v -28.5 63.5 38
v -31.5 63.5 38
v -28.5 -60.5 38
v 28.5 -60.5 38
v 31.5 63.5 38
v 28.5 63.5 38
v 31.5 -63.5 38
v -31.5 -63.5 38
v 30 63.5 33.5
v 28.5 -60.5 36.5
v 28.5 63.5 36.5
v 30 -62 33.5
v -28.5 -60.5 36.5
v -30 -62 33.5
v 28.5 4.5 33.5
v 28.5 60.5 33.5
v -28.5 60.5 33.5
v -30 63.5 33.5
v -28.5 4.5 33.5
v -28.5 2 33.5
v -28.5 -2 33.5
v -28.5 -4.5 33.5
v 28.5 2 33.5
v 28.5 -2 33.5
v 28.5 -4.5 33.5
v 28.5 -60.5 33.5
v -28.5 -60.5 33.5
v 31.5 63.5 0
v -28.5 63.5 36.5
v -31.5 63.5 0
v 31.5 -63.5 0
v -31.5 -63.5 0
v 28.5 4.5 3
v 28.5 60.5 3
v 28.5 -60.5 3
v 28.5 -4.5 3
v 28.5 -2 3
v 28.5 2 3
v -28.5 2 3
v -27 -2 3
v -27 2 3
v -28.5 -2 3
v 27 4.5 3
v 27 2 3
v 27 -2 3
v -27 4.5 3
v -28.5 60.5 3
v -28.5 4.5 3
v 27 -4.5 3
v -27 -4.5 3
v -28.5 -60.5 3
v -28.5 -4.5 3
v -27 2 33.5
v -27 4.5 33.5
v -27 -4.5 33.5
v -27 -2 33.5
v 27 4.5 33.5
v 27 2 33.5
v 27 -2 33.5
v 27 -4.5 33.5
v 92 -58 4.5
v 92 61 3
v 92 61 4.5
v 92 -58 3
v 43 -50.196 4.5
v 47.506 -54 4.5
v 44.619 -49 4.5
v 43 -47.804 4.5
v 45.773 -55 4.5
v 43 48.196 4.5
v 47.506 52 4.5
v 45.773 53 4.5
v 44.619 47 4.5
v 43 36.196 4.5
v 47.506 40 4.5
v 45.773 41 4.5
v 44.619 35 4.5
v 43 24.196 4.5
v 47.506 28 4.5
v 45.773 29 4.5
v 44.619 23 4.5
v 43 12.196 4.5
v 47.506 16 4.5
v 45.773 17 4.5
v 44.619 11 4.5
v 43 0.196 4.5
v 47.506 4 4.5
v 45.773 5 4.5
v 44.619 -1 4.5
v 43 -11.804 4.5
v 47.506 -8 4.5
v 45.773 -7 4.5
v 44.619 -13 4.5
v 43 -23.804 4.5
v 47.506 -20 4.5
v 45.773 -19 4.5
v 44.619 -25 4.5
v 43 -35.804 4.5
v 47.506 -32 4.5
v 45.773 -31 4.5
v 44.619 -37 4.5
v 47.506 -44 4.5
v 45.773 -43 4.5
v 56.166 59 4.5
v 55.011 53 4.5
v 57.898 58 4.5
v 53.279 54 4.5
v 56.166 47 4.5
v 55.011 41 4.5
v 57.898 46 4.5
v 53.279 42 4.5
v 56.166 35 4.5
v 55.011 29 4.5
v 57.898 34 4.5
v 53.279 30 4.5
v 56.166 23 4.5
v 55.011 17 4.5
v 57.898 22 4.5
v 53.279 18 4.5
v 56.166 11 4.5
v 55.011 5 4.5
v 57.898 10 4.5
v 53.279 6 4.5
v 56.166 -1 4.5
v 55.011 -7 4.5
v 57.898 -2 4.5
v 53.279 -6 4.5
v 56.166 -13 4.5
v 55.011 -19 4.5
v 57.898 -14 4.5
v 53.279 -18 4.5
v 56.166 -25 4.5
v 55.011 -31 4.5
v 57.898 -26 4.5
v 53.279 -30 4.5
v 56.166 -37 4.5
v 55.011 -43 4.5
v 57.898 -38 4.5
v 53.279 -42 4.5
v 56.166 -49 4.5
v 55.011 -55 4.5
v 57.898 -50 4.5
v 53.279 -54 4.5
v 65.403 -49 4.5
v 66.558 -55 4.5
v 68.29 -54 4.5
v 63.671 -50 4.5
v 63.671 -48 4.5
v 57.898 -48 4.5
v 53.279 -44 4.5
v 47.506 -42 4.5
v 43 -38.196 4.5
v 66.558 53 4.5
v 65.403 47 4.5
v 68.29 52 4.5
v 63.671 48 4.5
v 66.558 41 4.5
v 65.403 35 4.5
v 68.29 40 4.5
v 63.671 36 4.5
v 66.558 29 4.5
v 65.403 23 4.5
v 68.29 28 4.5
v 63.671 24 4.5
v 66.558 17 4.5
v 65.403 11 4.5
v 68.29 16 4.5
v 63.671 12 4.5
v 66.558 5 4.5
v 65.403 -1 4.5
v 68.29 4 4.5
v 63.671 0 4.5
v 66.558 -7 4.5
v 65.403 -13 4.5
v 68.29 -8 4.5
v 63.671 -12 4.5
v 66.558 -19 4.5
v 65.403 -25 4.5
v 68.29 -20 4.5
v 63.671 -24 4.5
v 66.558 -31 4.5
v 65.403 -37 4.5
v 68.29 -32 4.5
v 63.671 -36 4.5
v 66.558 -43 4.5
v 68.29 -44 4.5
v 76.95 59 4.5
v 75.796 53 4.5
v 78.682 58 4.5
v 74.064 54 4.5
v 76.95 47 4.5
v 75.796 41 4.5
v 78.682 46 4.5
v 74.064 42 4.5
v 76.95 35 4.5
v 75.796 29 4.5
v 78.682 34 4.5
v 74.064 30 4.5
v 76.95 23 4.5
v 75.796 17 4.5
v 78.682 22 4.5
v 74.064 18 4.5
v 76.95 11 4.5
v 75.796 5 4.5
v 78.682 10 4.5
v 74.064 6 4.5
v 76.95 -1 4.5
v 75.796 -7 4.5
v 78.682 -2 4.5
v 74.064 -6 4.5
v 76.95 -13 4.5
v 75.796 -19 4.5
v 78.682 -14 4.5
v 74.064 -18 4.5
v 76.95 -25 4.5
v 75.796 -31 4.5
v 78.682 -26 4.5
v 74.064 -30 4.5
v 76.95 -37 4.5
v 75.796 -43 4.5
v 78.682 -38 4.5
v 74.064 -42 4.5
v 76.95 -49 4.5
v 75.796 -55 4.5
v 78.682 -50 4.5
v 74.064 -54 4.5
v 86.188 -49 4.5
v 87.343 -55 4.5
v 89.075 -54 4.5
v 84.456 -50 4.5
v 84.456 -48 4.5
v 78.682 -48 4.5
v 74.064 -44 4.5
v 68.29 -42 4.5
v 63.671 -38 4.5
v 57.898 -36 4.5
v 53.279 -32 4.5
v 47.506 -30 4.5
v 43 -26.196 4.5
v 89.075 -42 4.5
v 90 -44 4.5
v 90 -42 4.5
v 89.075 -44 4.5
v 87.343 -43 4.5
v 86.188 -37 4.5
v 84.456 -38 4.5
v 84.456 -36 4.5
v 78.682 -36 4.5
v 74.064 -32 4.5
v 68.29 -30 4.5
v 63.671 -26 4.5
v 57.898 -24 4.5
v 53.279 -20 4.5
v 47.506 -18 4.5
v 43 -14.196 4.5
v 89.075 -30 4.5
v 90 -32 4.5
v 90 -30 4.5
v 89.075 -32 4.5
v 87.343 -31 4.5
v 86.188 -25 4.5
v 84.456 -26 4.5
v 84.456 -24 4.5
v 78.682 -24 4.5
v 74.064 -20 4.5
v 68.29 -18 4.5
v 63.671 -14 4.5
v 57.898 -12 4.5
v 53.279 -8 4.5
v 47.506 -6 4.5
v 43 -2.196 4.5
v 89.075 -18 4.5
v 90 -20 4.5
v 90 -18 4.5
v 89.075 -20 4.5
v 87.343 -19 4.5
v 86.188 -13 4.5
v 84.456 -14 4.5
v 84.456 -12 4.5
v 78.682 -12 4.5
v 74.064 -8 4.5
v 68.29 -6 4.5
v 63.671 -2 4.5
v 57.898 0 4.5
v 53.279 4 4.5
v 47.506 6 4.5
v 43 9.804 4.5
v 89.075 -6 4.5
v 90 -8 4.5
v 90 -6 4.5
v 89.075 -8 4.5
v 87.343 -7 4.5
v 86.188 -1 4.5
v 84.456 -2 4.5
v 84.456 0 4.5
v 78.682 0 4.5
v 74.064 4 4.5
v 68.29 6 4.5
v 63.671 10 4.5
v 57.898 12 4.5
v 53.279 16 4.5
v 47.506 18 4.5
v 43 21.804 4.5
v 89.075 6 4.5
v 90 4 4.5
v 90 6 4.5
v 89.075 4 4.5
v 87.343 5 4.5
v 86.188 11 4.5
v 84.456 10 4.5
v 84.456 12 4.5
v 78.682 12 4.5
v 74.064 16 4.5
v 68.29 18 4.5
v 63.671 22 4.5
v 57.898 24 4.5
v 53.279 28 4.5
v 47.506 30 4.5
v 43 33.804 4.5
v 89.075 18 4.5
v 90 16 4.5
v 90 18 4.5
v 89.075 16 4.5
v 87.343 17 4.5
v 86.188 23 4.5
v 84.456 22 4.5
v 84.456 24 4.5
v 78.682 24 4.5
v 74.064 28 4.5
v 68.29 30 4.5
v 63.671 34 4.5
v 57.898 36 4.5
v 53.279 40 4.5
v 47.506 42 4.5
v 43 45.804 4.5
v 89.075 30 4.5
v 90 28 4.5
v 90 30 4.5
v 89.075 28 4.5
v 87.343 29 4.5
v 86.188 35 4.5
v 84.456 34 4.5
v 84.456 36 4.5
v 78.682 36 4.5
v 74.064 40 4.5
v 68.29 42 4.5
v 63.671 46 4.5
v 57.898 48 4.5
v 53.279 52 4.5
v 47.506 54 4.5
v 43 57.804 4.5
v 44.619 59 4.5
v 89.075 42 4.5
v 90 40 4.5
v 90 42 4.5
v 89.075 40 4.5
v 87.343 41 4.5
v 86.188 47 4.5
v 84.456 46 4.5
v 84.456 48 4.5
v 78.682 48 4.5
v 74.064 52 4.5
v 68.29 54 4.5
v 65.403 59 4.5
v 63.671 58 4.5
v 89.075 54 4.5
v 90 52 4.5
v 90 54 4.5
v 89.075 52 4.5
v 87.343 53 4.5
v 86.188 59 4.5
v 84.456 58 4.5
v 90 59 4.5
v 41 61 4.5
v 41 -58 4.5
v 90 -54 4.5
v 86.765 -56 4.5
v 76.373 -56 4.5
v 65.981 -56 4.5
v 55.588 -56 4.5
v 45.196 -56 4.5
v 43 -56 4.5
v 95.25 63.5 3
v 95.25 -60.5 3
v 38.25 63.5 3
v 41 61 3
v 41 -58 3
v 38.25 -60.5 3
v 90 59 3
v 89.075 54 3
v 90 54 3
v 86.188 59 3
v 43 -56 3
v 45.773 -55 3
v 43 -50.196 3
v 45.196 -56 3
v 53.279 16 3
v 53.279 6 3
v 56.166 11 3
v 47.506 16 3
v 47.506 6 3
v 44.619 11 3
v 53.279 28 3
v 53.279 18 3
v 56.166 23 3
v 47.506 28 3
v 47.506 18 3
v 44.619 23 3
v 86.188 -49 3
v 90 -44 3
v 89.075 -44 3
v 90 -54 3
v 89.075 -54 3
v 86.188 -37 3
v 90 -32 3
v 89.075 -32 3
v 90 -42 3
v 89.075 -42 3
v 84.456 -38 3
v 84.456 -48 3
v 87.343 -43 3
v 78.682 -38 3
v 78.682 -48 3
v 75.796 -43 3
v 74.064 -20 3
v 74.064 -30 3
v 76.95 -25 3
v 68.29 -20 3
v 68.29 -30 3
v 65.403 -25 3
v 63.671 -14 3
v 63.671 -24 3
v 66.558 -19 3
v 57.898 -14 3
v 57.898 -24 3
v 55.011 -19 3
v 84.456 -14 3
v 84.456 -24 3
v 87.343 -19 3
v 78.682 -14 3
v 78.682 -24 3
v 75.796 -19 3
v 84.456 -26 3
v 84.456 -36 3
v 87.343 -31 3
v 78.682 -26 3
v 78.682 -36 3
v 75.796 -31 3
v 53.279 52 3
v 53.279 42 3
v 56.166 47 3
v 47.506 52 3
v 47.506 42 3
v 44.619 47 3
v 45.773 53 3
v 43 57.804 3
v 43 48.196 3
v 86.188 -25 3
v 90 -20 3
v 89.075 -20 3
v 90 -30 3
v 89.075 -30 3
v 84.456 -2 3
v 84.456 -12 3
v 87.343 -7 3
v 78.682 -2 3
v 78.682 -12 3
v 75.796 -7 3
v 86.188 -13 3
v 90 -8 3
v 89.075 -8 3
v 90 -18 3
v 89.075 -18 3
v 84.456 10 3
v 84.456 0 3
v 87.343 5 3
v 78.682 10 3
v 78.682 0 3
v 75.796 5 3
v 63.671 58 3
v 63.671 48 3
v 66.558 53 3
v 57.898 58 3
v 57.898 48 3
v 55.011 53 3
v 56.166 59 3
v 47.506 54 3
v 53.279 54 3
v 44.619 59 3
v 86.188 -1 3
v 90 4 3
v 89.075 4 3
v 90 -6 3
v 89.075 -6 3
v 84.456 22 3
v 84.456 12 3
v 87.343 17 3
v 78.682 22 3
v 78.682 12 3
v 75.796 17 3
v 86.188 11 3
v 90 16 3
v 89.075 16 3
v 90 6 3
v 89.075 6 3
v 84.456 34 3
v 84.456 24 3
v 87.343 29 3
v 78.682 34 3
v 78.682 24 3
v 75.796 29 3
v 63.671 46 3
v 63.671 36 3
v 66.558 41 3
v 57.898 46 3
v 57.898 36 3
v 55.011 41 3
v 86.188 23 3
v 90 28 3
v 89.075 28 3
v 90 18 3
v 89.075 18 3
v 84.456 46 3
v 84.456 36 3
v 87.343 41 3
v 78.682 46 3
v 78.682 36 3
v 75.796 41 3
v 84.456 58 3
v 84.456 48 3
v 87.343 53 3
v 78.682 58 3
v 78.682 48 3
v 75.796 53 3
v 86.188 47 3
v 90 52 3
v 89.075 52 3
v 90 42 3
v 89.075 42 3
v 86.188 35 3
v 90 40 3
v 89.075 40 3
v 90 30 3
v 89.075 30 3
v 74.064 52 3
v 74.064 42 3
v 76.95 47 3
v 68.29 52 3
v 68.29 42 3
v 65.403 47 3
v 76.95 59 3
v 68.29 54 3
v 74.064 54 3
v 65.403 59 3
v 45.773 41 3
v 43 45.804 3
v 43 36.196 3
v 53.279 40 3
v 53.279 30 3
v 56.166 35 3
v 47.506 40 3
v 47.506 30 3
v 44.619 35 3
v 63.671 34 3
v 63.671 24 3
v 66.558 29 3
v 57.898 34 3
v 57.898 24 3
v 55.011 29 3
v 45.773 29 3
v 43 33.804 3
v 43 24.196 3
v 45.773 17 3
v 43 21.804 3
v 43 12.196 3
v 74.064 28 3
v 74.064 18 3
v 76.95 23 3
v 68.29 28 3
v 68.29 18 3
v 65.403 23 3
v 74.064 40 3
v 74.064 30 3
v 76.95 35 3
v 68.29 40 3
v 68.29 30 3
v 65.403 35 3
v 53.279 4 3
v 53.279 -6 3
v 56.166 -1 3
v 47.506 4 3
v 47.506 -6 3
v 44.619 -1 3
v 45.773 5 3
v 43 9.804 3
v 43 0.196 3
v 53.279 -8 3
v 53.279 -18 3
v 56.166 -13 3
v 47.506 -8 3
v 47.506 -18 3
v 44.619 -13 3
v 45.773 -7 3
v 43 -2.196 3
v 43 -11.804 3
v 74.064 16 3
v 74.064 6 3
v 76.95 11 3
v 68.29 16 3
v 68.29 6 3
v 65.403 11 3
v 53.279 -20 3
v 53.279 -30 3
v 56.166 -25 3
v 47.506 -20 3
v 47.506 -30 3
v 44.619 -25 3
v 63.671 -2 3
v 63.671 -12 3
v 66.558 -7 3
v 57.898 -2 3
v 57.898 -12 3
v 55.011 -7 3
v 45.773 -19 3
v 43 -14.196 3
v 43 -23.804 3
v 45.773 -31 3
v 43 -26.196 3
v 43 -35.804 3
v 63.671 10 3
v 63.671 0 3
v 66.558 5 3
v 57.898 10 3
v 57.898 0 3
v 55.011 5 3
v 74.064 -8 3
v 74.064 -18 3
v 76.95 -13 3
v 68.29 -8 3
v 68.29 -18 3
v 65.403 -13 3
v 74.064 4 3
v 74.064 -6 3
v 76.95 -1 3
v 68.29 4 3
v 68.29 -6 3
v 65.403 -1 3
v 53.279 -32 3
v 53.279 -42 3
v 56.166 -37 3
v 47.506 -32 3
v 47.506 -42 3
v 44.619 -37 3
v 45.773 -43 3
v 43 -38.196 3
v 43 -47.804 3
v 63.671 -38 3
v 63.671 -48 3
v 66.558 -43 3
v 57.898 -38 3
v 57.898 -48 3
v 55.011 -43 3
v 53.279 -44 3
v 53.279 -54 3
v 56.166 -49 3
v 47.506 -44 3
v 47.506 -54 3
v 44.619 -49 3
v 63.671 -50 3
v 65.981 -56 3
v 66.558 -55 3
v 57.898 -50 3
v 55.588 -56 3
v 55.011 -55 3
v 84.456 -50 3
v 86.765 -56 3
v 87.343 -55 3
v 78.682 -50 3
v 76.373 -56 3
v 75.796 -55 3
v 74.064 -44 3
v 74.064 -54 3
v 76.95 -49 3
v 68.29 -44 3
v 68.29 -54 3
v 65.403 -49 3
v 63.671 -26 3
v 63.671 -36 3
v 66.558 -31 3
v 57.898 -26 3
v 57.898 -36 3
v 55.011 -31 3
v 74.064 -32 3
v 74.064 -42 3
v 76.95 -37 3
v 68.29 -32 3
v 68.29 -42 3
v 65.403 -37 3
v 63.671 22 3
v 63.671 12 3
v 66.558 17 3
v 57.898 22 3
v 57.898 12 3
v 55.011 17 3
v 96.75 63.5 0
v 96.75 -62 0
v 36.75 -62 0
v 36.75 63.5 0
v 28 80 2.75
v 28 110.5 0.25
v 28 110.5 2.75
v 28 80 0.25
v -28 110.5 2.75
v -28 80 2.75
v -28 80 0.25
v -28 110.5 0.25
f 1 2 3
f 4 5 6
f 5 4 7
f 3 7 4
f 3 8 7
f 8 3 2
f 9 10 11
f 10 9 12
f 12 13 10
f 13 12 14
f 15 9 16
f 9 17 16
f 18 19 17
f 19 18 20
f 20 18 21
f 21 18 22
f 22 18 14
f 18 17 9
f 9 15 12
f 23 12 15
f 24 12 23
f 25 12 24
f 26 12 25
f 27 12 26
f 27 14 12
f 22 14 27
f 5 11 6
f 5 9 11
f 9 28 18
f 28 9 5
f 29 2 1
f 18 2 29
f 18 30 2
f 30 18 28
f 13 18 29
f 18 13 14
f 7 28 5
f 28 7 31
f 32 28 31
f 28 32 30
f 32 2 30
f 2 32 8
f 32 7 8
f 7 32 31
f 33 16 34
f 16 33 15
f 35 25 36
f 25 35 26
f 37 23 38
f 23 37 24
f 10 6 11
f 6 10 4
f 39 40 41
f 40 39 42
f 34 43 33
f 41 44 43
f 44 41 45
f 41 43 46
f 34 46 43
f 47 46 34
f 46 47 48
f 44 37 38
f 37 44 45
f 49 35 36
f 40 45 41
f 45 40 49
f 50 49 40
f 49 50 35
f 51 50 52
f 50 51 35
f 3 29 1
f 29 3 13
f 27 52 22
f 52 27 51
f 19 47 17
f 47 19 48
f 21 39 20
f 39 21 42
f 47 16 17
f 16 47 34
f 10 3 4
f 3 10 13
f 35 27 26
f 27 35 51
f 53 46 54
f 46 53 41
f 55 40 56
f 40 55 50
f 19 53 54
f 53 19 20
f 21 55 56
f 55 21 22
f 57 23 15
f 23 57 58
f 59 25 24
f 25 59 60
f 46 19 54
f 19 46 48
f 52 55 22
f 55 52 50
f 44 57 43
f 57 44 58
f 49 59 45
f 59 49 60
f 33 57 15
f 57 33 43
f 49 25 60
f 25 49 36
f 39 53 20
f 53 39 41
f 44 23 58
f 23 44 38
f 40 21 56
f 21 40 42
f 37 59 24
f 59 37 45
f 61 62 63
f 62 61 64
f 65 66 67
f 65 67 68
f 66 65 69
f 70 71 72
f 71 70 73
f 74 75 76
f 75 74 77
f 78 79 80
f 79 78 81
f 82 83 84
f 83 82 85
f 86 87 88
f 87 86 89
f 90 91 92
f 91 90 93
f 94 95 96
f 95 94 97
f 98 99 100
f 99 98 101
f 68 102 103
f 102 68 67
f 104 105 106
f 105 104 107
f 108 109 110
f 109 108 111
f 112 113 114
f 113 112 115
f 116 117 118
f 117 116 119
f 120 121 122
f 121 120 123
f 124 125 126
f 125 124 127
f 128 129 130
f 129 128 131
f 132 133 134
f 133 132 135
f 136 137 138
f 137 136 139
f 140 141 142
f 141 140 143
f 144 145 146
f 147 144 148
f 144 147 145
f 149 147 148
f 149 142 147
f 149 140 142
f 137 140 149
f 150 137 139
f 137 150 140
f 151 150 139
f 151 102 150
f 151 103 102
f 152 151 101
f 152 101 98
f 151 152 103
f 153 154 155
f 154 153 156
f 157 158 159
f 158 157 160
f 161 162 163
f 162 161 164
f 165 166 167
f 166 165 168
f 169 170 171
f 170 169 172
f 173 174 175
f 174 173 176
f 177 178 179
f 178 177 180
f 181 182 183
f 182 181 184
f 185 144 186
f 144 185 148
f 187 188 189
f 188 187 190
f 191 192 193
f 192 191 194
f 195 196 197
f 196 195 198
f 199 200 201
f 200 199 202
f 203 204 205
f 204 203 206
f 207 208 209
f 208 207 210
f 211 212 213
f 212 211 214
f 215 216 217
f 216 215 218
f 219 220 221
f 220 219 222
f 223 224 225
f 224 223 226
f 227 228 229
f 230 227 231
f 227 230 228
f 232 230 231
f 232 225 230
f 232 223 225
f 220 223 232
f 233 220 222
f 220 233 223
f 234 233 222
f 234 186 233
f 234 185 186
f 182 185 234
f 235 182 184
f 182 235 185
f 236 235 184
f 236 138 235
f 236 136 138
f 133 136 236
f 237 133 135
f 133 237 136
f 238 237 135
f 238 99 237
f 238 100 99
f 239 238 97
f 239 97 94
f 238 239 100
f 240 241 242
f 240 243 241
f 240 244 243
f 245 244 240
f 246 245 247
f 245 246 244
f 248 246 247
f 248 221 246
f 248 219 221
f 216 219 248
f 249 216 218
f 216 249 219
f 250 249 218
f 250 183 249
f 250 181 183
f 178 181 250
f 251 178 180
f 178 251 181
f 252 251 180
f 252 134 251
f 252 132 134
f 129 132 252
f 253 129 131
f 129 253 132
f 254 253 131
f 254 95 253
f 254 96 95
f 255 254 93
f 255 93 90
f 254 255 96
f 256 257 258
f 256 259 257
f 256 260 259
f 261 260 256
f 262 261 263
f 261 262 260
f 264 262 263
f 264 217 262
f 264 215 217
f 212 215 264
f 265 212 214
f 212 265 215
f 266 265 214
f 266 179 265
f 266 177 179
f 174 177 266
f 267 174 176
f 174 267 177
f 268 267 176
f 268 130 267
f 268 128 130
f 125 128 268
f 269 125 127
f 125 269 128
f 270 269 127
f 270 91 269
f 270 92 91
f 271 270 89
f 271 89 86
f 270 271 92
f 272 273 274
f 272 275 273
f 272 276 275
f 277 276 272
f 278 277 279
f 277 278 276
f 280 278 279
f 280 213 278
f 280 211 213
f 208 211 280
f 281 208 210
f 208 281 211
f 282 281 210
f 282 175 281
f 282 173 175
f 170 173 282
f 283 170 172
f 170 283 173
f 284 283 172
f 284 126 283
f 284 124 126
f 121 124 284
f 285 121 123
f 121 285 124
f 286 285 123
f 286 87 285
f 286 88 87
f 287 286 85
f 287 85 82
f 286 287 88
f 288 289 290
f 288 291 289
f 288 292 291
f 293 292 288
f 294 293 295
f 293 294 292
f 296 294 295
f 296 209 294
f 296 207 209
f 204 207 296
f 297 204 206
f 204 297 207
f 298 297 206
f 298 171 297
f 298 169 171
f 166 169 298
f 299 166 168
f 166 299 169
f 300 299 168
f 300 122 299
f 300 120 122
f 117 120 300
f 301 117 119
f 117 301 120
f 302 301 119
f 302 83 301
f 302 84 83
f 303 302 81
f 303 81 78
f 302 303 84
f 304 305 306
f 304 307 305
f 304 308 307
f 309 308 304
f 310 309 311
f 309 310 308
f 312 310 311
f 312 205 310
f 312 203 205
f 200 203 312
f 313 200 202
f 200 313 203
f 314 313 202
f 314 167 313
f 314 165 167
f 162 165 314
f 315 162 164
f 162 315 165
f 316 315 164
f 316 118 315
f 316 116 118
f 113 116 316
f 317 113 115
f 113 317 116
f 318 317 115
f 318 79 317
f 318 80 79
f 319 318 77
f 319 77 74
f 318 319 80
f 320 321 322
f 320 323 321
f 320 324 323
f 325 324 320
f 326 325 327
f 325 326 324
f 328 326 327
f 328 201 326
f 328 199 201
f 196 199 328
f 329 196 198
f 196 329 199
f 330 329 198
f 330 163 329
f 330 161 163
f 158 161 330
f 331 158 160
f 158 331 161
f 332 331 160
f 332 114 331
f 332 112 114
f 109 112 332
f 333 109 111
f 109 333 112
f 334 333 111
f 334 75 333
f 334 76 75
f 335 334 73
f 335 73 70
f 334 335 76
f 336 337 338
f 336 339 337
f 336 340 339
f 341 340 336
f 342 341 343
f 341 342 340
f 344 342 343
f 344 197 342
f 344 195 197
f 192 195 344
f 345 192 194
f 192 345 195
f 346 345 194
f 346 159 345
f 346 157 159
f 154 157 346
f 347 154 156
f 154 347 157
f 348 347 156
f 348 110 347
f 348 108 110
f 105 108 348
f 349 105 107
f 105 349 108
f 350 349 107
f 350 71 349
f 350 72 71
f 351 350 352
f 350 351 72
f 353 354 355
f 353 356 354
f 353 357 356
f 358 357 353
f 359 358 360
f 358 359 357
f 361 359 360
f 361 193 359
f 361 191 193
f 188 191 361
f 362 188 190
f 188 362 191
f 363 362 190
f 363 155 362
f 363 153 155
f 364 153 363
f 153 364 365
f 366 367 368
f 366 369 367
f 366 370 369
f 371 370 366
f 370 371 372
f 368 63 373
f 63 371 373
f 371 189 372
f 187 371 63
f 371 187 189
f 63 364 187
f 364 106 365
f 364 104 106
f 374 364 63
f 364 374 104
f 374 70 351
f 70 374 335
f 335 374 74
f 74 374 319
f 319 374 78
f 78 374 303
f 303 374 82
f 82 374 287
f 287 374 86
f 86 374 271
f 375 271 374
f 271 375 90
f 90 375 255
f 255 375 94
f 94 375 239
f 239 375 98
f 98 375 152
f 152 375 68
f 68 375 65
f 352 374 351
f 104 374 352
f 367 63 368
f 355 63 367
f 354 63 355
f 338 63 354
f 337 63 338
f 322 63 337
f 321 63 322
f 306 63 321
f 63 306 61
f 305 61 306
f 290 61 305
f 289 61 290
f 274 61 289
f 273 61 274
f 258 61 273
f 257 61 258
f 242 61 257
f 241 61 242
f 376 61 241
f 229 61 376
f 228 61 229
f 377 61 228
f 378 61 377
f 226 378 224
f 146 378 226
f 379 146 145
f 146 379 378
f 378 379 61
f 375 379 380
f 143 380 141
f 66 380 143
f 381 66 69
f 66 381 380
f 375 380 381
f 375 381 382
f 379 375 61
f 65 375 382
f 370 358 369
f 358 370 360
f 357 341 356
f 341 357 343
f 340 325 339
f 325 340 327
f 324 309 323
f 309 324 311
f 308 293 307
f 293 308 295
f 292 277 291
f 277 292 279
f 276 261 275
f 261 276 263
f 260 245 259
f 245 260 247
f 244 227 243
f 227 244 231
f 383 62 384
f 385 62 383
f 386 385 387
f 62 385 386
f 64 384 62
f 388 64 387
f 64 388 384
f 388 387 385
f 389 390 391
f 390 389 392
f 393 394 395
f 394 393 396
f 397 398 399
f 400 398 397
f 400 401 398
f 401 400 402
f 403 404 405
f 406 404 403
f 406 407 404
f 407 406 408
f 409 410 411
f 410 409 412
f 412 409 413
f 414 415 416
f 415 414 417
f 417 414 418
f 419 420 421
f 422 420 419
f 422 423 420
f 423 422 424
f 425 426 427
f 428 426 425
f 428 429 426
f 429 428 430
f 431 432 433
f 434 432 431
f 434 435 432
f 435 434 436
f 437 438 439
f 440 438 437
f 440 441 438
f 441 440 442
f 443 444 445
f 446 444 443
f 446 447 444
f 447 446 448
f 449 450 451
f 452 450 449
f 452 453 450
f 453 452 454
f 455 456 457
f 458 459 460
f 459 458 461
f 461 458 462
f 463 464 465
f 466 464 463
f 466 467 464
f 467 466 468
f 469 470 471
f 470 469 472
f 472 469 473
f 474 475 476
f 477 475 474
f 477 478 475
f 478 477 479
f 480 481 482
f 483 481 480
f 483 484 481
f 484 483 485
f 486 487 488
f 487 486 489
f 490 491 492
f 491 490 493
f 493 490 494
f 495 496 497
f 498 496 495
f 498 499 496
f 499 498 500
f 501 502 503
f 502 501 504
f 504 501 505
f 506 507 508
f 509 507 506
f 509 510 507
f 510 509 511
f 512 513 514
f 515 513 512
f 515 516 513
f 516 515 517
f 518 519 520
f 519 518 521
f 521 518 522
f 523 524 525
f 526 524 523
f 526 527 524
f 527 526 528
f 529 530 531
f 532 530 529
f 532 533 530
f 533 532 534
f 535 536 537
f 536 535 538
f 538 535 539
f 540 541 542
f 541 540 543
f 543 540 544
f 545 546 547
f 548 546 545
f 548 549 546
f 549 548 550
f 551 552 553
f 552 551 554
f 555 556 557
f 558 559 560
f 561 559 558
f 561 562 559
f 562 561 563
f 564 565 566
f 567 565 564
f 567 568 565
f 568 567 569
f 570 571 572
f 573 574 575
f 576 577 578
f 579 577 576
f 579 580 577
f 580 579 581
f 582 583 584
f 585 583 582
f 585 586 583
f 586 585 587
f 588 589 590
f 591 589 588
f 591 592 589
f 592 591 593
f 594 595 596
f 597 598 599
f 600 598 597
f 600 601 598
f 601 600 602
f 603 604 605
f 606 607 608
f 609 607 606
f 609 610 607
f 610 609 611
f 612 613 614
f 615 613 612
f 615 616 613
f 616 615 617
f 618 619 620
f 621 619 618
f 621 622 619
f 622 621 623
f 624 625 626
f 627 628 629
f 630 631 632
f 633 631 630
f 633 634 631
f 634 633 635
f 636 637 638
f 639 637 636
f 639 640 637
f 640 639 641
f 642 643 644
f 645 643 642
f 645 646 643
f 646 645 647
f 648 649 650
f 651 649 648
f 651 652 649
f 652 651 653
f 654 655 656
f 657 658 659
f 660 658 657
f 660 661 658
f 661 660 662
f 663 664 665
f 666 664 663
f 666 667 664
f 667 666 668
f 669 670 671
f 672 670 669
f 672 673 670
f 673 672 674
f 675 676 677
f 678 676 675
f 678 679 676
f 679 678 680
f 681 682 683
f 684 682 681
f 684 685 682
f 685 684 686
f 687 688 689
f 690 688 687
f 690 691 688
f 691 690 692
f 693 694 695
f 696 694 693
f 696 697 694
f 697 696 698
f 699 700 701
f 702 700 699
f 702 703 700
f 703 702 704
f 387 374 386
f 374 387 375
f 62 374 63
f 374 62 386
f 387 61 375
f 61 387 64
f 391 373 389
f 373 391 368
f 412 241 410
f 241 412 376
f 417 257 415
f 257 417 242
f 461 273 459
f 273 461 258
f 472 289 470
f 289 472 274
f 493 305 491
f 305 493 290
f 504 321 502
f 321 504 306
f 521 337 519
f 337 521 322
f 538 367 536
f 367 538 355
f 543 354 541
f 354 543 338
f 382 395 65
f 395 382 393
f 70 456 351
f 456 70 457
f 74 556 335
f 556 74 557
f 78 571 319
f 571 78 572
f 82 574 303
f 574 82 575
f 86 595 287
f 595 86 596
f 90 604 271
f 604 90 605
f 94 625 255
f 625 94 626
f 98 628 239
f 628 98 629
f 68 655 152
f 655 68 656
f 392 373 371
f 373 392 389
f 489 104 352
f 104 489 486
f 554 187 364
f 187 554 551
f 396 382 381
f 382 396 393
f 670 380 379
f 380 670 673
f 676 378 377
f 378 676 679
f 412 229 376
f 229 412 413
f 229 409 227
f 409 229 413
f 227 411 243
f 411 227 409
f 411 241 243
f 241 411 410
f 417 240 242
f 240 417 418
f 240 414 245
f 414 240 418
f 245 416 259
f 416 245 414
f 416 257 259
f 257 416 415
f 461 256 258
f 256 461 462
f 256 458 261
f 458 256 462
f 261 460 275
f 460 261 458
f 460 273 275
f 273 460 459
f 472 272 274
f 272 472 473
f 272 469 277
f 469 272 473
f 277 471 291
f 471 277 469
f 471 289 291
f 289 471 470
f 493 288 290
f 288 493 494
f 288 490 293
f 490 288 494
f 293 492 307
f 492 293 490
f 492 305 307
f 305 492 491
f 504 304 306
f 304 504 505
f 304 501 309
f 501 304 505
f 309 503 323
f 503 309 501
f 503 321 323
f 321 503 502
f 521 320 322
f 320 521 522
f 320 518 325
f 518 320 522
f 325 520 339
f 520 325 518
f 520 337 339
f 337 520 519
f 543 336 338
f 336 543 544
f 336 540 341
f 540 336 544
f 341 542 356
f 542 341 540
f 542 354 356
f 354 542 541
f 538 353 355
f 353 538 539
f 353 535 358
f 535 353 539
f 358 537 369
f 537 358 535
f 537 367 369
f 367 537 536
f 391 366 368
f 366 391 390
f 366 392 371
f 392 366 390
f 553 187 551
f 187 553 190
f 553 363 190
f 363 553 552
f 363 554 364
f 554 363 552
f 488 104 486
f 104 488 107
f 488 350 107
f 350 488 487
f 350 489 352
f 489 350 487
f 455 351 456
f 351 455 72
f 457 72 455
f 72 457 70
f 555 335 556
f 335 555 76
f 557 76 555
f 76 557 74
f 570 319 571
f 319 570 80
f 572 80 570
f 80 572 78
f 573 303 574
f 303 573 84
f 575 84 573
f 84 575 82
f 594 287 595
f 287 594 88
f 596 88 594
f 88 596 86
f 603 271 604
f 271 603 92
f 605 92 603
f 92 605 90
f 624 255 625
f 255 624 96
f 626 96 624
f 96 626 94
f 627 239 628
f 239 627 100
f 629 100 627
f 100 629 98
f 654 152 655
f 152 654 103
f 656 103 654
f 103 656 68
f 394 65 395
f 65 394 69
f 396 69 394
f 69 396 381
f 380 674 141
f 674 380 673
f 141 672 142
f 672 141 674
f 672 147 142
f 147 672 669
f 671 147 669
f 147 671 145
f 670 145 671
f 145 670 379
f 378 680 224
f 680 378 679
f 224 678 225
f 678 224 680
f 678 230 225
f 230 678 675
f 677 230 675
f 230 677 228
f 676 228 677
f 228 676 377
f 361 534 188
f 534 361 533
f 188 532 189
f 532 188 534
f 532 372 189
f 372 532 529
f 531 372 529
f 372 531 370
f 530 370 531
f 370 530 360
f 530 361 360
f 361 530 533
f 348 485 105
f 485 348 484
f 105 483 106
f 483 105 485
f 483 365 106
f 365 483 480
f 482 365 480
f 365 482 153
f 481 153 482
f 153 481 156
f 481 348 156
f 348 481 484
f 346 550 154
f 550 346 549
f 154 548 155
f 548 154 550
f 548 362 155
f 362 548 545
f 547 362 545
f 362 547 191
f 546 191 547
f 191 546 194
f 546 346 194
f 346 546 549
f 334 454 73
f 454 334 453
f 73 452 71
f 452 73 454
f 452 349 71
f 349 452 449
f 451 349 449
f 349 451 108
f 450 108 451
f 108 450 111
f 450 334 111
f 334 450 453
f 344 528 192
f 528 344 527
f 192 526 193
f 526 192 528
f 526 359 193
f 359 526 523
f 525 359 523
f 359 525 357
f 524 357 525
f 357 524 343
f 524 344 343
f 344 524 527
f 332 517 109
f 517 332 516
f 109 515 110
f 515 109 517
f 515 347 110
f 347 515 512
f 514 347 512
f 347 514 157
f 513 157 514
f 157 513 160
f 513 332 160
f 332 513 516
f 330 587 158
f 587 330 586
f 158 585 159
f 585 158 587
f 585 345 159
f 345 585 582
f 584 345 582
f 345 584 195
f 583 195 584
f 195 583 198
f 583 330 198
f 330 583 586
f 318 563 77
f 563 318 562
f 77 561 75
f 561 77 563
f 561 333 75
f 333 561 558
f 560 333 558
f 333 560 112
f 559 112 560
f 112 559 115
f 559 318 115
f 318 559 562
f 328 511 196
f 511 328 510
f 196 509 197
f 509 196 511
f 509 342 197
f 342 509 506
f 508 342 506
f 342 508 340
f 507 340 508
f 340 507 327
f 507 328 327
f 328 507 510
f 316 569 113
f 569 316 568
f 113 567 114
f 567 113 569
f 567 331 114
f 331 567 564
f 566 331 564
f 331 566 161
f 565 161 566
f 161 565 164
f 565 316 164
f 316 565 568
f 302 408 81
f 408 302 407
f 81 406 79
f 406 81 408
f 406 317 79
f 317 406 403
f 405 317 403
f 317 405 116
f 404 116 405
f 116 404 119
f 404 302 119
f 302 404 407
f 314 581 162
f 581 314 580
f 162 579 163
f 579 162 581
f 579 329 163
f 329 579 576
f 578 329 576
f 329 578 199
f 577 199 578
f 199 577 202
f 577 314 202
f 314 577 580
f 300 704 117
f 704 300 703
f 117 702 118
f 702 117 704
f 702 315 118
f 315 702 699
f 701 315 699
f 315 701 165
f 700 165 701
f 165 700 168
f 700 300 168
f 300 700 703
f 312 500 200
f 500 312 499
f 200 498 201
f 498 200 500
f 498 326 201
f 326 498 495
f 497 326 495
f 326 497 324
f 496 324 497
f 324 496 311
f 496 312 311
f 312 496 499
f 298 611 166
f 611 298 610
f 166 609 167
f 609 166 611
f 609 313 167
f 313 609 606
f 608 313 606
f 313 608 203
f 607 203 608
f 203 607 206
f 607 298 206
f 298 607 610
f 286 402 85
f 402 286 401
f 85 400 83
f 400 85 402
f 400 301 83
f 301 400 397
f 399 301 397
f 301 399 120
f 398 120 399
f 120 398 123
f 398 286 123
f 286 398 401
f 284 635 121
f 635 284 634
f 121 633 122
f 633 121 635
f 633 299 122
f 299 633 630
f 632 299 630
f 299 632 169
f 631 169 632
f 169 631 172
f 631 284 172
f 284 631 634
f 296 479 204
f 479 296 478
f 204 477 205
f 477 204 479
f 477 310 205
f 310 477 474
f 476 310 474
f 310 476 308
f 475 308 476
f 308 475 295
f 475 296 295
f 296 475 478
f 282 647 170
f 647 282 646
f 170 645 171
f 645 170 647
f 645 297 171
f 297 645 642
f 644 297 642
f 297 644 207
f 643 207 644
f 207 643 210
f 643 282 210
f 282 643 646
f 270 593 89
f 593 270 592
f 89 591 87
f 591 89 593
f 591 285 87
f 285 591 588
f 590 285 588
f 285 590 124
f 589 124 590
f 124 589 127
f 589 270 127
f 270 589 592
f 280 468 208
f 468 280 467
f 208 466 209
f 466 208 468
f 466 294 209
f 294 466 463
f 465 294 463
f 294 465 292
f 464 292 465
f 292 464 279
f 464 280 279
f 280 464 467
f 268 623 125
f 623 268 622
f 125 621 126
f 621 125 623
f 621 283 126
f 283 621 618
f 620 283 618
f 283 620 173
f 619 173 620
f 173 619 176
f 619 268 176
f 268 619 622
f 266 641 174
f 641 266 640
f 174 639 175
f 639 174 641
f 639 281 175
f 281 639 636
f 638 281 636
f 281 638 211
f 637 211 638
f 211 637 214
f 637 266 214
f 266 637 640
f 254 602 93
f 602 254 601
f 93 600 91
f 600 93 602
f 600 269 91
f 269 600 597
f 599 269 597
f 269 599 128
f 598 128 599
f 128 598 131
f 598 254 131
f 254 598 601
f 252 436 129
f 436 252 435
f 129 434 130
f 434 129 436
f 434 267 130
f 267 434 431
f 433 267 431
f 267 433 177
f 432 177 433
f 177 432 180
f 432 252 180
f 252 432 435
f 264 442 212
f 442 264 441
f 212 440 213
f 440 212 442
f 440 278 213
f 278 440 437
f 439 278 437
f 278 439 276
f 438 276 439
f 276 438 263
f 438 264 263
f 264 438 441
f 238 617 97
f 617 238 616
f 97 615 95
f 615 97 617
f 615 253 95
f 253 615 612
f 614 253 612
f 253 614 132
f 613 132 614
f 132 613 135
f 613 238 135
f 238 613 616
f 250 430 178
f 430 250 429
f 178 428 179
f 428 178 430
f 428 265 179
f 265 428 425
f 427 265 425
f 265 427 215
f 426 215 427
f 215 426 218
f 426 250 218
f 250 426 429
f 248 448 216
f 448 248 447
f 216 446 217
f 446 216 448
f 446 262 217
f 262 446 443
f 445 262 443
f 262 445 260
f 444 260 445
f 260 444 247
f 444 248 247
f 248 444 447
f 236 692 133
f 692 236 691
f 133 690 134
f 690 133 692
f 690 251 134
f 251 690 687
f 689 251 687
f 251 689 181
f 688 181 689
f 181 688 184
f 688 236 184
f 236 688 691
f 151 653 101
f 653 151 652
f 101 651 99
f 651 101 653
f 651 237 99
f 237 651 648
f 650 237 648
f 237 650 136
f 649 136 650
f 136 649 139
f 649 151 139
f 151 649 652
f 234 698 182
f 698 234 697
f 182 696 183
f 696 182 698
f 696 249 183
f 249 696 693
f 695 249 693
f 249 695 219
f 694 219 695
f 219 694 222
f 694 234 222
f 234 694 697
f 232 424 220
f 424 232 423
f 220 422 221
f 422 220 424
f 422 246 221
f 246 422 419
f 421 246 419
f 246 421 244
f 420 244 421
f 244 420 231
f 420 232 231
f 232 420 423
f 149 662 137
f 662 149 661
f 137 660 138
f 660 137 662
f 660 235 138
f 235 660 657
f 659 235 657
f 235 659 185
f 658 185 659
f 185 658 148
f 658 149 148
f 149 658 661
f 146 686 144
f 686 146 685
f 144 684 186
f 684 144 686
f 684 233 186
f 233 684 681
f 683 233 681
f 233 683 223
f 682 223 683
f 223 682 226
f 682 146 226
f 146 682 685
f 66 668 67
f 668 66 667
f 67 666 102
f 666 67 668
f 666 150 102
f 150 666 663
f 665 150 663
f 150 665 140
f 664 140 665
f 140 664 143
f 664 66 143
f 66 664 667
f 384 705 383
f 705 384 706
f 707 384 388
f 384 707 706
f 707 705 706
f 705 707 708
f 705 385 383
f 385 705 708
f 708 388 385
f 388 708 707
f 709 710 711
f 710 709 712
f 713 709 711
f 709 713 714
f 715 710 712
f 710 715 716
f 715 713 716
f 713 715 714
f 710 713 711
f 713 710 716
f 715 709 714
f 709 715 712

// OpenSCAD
// Parameterized box generator
// Originally written by Brad Koehn
// Heavily modified by Eric Hankinson to include honeycomb grid on lid, and flatten groove to prevent pushout of box walls.
// Requires OpenSCAD 2014.03 or newer

// box dimensions in millimeters
// typically you want the height < width < length
box_width = 63; // x axis
box_length = 127;  // y axis
box_height = 38; // z axis

// thickness of all walls and lid
wall_width = 3;

// how far from the top of the box the lid notch should go
notch_height = 6;

// how deep into the wall the lid notch should go
notch_depth = wall_width / 2;

// diameter of button on lid; Set to 0 for no button
button_diameter = 0;

// height of button on lid
button_height = wall_width / 2;

// how thick walls of the honeycomb are
honeycomb_wall_thickness = 2;

// how thick/deep the honeycomb is; Set to 0 for no honeycomb
// alternatively, you can calculate the height based on the
// notch_height so the honeycomb is no taller than the top of the box
//honeycomb_depth = 2;
honeycomb_depth = notch_height - wall_width * 1.5;

// diameter of each honeycomb
honeycomb_diameter = 10;

// width of the honeycomb pattern
honeycomb_width = box_width - (wall_width * 4);

// length of the honeycomb pattern
honeycomb_length = box_length - (wall_width * 4);


/*
If you need extra strength in the walls
*/

// length & width of the wall support column
wall_support_width = 0;

// calculate the height of the column to be right underneath the lid track
wall_support_height = box_height - (notch_depth + (2 * wall_width));

/*
If you want a sliding divider that splits the length of the box internally
*/
//divider_wall = 0;
divider_wall = wall_width;

/*
The lid, slightly smaller than the slot in the box. The inset will give just enough that printing
will either require no trimming or little sanding to get the lid to slide easily in the box.
*/

union () {
    translate([0, 0, box_height / 2])
        difference () {
            // our solid box
            cube([box_width, box_length, box_height], center = true);

            // remove the inside
            translate([0, 0, wall_width / 2])
                cube([box_width - wall_width * 2, box_length - wall_width * 2, box_height - wall_width], center = true);

            // remove notch for lid
            translate([0, 0, box_height / 2 - notch_height / 2])
                lid();

            // remove the unnecessary part of box where the lid slides in
            translate([0, wall_width / 2, box_height / 2 ])
                cube([box_width - wall_width * 2, box_length - wall_width, notch_height], center = true);
        };

    if (wall_support_width > 0) {
        translate([- (.5 * (box_width - (4 * wall_width))), 0, (.5 * wall_support_height) + wall_width]) {
            cube([wall_width * 2, wall_width * 2, wall_support_height], center = true);
        }

        translate([(.5 * (box_width - (4 * wall_width))), 0, (.5 * wall_support_height) + wall_width]) {
            cube([wall_width * 2, wall_width * 2, wall_support_height], center = true);
        }
    }
    
    if (divider_wall > 0) {
        difference () {
            union() {
                translate([- (.5 * (box_width - (2.5 * wall_width))), 0, (.5 * wall_support_height) + wall_width]) {
                    cube([wall_width / 2, wall_width * 3, wall_support_height], center = true);
                }

                translate([(.5 * (box_width - (2.5 * wall_width))), 0, (.5 * wall_support_height) + wall_width]) {
                    cube([wall_width / 2, wall_width * 3, wall_support_height], center = true);
                }
            }
            
            translate([0, 0, (.5 * wall_support_height + wall_width)]) {
                cube([box_width, wall_width + 1, wall_support_height], center = true);
            }
        }
    }
};



translate([box_width + 4, 0, wall_width / 2]) {
    lid(0.25);
};

if (divider_wall > 0) {
    translate([0, .75 * box_length, .5 * wall_width]) {
        cube([box_width - (wall_width * 2) - 1, wall_support_height, wall_width - .5], center = true);
    }
}

module walledDivider() {
    
}

module divider(thickness = 0, width = 0, height = 0) {
    
}

module lid(inset = 0) {
    union() {
        polyhedron(
            points = [
                // top points, clockwise starting at max x, max y
                [box_width / 2 - wall_width - inset, box_length / 2, notch_depth], // 0
                [box_width / 2 - wall_width - inset, -(box_length / 2 - wall_width), notch_depth], // 1
                [-(box_width / 2 - wall_width + inset), -(box_length / 2 - wall_width), notch_depth], // 2
                [-(box_width / 2 - wall_width + inset), box_length / 2, notch_depth], // 3

                // middle points, clockwise starting at max x, max y
                [box_width / 2 - wall_width + notch_depth - inset, box_length / 2, -notch_depth], // 4
                [box_width / 2 - wall_width + notch_depth - inset, -(box_length / 2 - wall_width + notch_depth), -notch_depth], // 5
                [-(box_width / 2 - wall_width  + notch_depth + inset), -(box_length / 2 - wall_width + notch_depth), -notch_depth], // 6
                [-(box_width / 2 - wall_width  + notch_depth + inset), box_length / 2, -notch_depth], // 7

                // bottom points, clockwise starting at max x, max y
                [box_width / 2 - wall_width - inset, box_length / 2, -notch_depth], // 8
                [box_width / 2 - wall_width - inset, -(box_length / 2 - wall_width), -notch_depth], // 9
                [-(box_width / 2 - wall_width + inset), -(box_length / 2 - wall_width), -notch_depth], // 10
                [-(box_width / 2 - wall_width + inset), box_length / 2, -notch_depth], // 11
            ],
            faces = [
                [0, 1, 2, 3], // top face

                [0, 4, 5, 1], // left top notch
                [1, 5, 6, 2], // back top notch
                [3, 2, 6, 7], // right top notch

                [4, 8, 9, 5], // left bottom notch
                [5, 9, 10, 6], // back botton notch
                [7, 6, 10, 11], // right bottom notch

                [11, 10, 9, 8], // bottom face

                [0, 3, 7, 11, 8, 4] // front face
            ]
        );

        if (button_diameter > 0) {
            translate([0, box_length / 2 - button_diameter, wall_width / 2]) {
                cylinder(
                    d = button_diameter,
                    h = button_height
                );
            };
        }

        if (honeycomb_depth > 0) {
            translate([-((.5 * honeycomb_width) + (wall_width / 6)), - ((.5 * honeycomb_length) - (wall_width / 2)), wall_width / 2]) {
                union() {
                    honeycomb(honeycomb_length, honeycomb_width, honeycomb_depth, honeycomb_diameter, honeycomb_wall_thickness);
                    
                    difference() {
                        translate([(.5 * honeycomb_width), (.5 * honeycomb_length), wall_width / 4]) {
                            cube([honeycomb_width, honeycomb_length + (honeycomb_wall_thickness * 2), honeycomb_depth], center = true);
                        };
                        
                        translate([(.5 * honeycomb_width), (.5 * honeycomb_length), wall_width / 4]) {
                            cube([honeycomb_width - (honeycomb_wall_thickness * 2), honeycomb_length , honeycomb_depth], center = true);
                        };
                    };
                };
            };
        }
    };
}

module hc_column(length, cell_size, wall_thickness) {
    no_of_cells = floor(length / (cell_size + wall_thickness)) ;

    for (i = [0 : no_of_cells]) {
        translate([0, (i * (cell_size + wall_thickness)), 0]) {
            circle($fn = 6, r = cell_size * (sqrt(3)/3));
        }
    }
}

module honeycomb (width, length, height, cell_size, wall_thickness) {
    no_of_rows = floor(1.2 * length / (cell_size + wall_thickness));

    tr_mod = cell_size + wall_thickness;
    tr_x = sqrt(3)/2 * tr_mod;
    tr_y = tr_mod / 2;
    off_x = -1 * wall_thickness / 2;
    off_y = wall_thickness / 2;

    linear_extrude(height = height, convexity = 10, twist = 0, slices = 1)
    {
        difference() {
            square([length, width]);
            for (i = [0 : no_of_rows]) {
                translate([i * tr_x + off_x, (i % 2) * tr_y + off_y,0])
                hc_column(width, cell_size, wall_thickness);
            }
        };
    };
}
